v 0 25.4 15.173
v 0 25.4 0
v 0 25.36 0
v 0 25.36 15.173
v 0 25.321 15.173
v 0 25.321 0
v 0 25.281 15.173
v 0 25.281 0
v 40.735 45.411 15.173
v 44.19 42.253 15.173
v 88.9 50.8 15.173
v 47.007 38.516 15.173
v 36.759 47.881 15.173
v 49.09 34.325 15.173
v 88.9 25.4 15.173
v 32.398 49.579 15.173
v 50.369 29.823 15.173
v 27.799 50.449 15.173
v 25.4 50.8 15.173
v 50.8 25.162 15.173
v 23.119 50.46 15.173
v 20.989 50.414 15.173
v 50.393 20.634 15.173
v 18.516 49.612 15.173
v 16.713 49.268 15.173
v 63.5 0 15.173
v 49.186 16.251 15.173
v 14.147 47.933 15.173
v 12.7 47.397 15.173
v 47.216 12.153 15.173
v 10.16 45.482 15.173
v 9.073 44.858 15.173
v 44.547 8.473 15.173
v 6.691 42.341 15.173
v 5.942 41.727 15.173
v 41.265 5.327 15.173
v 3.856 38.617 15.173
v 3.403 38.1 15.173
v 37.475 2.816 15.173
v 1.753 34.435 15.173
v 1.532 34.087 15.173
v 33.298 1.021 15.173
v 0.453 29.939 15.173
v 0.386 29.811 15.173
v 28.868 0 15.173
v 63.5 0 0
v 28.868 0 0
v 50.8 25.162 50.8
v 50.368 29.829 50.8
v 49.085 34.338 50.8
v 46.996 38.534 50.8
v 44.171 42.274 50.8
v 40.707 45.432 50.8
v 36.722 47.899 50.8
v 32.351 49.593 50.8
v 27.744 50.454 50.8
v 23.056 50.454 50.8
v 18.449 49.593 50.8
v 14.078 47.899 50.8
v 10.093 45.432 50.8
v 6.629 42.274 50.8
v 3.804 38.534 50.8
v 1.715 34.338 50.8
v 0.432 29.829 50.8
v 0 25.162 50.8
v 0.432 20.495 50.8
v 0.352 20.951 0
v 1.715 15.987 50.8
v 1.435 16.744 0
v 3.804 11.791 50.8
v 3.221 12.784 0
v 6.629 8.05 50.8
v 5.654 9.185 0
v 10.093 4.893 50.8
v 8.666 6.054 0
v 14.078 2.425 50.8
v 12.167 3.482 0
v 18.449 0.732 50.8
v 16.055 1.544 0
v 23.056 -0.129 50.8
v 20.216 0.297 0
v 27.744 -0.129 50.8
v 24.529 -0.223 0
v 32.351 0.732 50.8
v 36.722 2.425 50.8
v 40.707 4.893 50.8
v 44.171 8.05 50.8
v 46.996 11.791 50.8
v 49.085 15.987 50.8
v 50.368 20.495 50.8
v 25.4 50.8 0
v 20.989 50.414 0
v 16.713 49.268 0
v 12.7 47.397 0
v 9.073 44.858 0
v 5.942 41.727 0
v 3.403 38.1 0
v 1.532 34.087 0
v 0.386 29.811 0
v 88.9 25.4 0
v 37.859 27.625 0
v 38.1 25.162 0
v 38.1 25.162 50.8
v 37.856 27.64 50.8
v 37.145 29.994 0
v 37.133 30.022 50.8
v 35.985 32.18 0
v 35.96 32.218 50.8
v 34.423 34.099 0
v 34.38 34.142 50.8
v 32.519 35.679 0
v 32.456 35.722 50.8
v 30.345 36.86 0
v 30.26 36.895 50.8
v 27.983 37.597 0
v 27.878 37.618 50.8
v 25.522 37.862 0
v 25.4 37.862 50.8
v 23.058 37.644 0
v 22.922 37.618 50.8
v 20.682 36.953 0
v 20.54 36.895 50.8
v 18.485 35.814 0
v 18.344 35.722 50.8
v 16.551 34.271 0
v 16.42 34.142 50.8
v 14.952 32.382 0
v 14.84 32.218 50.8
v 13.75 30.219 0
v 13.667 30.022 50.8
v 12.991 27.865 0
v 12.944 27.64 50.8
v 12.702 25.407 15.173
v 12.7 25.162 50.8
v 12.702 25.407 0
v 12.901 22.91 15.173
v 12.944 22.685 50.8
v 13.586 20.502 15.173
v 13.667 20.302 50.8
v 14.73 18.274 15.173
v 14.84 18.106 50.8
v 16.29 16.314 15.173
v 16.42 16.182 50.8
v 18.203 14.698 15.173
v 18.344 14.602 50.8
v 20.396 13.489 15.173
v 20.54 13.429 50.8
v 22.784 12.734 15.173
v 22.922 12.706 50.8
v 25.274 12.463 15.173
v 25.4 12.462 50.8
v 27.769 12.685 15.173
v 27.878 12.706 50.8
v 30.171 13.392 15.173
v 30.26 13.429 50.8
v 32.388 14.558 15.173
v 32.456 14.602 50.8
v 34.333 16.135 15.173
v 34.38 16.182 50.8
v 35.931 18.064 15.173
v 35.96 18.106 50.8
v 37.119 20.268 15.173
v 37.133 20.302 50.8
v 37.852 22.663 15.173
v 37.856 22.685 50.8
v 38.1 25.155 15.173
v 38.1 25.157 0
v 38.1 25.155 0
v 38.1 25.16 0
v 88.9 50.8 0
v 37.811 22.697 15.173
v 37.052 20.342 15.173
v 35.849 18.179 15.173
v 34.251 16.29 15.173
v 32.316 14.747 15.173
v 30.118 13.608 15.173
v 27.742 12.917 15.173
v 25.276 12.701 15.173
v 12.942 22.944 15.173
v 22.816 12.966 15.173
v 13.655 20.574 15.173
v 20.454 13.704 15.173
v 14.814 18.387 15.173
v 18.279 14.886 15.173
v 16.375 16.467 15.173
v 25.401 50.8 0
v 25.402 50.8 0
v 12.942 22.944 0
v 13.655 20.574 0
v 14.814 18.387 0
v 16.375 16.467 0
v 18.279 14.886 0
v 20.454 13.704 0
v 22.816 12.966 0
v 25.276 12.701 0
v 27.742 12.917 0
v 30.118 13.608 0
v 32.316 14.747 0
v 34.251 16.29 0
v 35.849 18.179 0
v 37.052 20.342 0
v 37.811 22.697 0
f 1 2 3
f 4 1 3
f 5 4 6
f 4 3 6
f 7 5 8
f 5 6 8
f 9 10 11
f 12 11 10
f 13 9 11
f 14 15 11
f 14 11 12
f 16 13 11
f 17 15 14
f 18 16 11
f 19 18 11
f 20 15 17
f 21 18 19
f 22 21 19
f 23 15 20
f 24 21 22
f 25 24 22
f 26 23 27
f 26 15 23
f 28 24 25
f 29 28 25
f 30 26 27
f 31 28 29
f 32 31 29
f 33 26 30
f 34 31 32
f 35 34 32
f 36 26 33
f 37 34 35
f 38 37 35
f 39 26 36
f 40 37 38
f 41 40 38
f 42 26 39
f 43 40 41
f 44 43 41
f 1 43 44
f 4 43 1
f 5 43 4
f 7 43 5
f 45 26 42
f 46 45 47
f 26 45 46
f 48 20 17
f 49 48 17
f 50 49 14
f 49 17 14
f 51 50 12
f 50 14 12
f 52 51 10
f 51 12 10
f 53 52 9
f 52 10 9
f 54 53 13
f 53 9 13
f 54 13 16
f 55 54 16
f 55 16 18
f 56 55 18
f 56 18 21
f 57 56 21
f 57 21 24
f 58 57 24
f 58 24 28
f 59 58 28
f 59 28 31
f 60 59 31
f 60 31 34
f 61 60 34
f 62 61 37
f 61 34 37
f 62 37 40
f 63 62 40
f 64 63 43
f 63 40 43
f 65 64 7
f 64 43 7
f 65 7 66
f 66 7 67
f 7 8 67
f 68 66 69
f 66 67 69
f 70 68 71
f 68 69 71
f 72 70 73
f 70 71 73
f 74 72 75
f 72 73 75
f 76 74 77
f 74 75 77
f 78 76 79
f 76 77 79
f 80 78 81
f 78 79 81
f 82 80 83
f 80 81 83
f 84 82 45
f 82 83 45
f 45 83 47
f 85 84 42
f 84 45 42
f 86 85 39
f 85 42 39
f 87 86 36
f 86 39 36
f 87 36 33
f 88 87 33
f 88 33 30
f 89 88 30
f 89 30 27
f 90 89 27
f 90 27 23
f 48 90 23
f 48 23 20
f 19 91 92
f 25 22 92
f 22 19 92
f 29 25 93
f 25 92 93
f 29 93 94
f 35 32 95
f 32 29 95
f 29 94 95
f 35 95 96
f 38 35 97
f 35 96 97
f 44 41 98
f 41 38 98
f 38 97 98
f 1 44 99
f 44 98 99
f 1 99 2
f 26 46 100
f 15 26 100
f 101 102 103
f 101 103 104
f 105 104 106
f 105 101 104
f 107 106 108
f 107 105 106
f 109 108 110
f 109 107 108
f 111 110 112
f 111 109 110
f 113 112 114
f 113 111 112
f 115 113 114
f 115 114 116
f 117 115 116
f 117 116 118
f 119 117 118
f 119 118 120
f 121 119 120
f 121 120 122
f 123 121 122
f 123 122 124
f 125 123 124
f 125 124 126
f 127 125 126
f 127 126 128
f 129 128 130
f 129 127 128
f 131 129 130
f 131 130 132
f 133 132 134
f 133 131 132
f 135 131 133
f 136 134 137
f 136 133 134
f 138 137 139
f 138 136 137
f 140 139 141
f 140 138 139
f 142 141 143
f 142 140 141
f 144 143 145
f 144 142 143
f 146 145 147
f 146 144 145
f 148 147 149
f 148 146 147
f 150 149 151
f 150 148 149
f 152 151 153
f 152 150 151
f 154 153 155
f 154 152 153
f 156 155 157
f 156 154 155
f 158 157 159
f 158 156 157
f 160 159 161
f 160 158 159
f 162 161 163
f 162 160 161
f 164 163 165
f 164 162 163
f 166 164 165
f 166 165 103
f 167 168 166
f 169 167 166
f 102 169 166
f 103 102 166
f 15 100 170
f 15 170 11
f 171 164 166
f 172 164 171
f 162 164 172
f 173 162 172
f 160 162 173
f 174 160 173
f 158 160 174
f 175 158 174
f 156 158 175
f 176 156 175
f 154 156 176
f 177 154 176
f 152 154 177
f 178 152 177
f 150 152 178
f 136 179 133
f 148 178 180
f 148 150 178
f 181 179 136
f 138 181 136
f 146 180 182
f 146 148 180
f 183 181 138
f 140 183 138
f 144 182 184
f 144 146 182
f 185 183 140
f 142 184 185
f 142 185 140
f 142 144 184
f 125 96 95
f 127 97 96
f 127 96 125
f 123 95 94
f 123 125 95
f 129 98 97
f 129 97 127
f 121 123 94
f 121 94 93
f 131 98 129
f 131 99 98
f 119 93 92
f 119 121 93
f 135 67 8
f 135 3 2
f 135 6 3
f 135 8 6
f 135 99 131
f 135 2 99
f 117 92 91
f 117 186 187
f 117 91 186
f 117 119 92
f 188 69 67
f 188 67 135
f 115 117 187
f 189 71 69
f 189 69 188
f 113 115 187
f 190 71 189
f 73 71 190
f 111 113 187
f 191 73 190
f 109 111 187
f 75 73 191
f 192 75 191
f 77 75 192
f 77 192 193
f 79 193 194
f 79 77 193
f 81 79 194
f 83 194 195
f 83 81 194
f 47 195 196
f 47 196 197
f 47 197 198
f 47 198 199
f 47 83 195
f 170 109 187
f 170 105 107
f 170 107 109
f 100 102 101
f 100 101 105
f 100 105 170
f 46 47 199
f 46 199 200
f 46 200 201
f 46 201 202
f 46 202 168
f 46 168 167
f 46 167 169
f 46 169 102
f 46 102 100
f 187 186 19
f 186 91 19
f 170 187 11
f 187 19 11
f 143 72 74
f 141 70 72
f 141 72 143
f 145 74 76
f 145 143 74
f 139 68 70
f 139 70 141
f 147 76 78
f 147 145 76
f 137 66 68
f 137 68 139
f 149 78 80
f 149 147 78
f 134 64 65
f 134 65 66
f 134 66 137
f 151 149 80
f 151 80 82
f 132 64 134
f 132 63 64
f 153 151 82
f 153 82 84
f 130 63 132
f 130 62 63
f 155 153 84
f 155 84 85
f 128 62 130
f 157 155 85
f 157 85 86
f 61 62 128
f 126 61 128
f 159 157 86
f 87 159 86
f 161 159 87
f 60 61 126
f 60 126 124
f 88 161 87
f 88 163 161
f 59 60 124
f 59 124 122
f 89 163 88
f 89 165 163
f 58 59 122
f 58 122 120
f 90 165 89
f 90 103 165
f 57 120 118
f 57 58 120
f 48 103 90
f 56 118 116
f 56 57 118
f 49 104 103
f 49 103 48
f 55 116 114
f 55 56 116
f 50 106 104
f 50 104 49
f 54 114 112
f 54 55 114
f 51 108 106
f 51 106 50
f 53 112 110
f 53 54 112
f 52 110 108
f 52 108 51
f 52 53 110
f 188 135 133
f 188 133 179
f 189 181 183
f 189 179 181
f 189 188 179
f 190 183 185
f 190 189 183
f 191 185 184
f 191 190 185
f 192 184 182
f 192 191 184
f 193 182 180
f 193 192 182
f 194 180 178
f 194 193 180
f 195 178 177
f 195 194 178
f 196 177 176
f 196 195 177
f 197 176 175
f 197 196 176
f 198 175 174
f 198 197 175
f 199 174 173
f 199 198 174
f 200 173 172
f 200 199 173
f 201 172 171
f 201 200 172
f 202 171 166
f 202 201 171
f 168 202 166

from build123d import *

# Parameters (mm, degrees)
F2_DEPTH = 50.8
F1_R     = 12.7
F3_DEPTH = 50.8
F4_R     = 25.4
F4_R_2   = 12.7
F5_DEPTH = 50.8


# Not quite as in the source:
# - ends of sketch curves that miss each other by under 0.0002 mm in the source are joined


with BuildPart() as f2:
    # F0 (on Front) → F2 (new body)
    with BuildSketch(Plane.XZ):
        Polygon((0, 15.1726854965), (0, 0), (88.9, 0), (88.9, 15.1726854965), (38.1, 15.1726854965), align=None)
    extrude(amount=-F2_DEPTH)

    # F1 (on Top) → F3 (intersect)
    with BuildSketch(Plane.XY):
        with BuildLine():
            ThreePointArc((25.4023582082, 0), (43.3628704503, 7.4394877579), (50.8023582082, 25.4))
            ThreePointArc((50.8023582082, 25.4), (50.8017686493, 25.5730584989), (50.8, 25.7461089641))
            ThreePointArc((50.8, 25.7461089641), (43.2400827311, 43.4824661992), (25.4023582082, 50.8))
            ThreePointArc((25.4023582082, 50.8), (25.4011791041, 50.7999999726), (25.4, 50.7999998905))
            ThreePointArc((25.4, 50.7999998905), (0.0023582082, 25.4), (25.4, 1.095e-07))
            ThreePointArc((25.4, 1.095e-07), (25.4011791041, 2.74e-08), (25.4023582082, 0))
        make_face()
        with Locations((25.4023582082, 25.4)):
            Circle(F1_R, mode=Mode.SUBTRACT)
        with BuildLine():
            ThreePointArc((50.8, 25.7461089641), (50.8017686493, 25.5730584989), (50.8023582082, 25.4))
            ThreePointArc((50.8023582082, 25.4), (43.3628704503, 7.4394877579), (25.4023582082, 0))
            Line((25.4023582082, 0), (51.1508577362, 0))
            Line((51.1508577362, 0), (63.5, 0))
            Line((63.5, 0), (88.9, 25.4))
            Line((88.9, 25.4), (88.9, 50.8))
            Line((88.9, 50.8), (50.4585755345, 50.8))
            Line((50.4585755345, 50.8), (25.4023582082, 50.8))
            ThreePointArc((25.4023582082, 50.8), (43.2400827311, 43.4824661992), (50.8, 25.7461089641))
        make_face()
        with BuildLine():
            ThreePointArc((0, 25.4), (7.4394877579, 7.4394877579), (25.4, 0))
            ThreePointArc((25.4, 0), (0.0023582082, 25.4), (25.4, 50.7999998905))
            ThreePointArc((25.4, 50.7999998905), (7.4394877579, 43.3605122421), (0, 25.4))
        make_face()
    extrude(amount=F3_DEPTH, mode=Mode.INTERSECT)

    # F4 (on Top) → F5 (join)
    with BuildSketch(Plane.XY):
        with Locations((25.4, 25.1621566713)):
            Circle(F4_R)
        with Locations((25.4, 25.1621566713)):
            Circle(F4_R_2, mode=Mode.SUBTRACT)
    extrude(amount=F5_DEPTH)


solid = f2.part
